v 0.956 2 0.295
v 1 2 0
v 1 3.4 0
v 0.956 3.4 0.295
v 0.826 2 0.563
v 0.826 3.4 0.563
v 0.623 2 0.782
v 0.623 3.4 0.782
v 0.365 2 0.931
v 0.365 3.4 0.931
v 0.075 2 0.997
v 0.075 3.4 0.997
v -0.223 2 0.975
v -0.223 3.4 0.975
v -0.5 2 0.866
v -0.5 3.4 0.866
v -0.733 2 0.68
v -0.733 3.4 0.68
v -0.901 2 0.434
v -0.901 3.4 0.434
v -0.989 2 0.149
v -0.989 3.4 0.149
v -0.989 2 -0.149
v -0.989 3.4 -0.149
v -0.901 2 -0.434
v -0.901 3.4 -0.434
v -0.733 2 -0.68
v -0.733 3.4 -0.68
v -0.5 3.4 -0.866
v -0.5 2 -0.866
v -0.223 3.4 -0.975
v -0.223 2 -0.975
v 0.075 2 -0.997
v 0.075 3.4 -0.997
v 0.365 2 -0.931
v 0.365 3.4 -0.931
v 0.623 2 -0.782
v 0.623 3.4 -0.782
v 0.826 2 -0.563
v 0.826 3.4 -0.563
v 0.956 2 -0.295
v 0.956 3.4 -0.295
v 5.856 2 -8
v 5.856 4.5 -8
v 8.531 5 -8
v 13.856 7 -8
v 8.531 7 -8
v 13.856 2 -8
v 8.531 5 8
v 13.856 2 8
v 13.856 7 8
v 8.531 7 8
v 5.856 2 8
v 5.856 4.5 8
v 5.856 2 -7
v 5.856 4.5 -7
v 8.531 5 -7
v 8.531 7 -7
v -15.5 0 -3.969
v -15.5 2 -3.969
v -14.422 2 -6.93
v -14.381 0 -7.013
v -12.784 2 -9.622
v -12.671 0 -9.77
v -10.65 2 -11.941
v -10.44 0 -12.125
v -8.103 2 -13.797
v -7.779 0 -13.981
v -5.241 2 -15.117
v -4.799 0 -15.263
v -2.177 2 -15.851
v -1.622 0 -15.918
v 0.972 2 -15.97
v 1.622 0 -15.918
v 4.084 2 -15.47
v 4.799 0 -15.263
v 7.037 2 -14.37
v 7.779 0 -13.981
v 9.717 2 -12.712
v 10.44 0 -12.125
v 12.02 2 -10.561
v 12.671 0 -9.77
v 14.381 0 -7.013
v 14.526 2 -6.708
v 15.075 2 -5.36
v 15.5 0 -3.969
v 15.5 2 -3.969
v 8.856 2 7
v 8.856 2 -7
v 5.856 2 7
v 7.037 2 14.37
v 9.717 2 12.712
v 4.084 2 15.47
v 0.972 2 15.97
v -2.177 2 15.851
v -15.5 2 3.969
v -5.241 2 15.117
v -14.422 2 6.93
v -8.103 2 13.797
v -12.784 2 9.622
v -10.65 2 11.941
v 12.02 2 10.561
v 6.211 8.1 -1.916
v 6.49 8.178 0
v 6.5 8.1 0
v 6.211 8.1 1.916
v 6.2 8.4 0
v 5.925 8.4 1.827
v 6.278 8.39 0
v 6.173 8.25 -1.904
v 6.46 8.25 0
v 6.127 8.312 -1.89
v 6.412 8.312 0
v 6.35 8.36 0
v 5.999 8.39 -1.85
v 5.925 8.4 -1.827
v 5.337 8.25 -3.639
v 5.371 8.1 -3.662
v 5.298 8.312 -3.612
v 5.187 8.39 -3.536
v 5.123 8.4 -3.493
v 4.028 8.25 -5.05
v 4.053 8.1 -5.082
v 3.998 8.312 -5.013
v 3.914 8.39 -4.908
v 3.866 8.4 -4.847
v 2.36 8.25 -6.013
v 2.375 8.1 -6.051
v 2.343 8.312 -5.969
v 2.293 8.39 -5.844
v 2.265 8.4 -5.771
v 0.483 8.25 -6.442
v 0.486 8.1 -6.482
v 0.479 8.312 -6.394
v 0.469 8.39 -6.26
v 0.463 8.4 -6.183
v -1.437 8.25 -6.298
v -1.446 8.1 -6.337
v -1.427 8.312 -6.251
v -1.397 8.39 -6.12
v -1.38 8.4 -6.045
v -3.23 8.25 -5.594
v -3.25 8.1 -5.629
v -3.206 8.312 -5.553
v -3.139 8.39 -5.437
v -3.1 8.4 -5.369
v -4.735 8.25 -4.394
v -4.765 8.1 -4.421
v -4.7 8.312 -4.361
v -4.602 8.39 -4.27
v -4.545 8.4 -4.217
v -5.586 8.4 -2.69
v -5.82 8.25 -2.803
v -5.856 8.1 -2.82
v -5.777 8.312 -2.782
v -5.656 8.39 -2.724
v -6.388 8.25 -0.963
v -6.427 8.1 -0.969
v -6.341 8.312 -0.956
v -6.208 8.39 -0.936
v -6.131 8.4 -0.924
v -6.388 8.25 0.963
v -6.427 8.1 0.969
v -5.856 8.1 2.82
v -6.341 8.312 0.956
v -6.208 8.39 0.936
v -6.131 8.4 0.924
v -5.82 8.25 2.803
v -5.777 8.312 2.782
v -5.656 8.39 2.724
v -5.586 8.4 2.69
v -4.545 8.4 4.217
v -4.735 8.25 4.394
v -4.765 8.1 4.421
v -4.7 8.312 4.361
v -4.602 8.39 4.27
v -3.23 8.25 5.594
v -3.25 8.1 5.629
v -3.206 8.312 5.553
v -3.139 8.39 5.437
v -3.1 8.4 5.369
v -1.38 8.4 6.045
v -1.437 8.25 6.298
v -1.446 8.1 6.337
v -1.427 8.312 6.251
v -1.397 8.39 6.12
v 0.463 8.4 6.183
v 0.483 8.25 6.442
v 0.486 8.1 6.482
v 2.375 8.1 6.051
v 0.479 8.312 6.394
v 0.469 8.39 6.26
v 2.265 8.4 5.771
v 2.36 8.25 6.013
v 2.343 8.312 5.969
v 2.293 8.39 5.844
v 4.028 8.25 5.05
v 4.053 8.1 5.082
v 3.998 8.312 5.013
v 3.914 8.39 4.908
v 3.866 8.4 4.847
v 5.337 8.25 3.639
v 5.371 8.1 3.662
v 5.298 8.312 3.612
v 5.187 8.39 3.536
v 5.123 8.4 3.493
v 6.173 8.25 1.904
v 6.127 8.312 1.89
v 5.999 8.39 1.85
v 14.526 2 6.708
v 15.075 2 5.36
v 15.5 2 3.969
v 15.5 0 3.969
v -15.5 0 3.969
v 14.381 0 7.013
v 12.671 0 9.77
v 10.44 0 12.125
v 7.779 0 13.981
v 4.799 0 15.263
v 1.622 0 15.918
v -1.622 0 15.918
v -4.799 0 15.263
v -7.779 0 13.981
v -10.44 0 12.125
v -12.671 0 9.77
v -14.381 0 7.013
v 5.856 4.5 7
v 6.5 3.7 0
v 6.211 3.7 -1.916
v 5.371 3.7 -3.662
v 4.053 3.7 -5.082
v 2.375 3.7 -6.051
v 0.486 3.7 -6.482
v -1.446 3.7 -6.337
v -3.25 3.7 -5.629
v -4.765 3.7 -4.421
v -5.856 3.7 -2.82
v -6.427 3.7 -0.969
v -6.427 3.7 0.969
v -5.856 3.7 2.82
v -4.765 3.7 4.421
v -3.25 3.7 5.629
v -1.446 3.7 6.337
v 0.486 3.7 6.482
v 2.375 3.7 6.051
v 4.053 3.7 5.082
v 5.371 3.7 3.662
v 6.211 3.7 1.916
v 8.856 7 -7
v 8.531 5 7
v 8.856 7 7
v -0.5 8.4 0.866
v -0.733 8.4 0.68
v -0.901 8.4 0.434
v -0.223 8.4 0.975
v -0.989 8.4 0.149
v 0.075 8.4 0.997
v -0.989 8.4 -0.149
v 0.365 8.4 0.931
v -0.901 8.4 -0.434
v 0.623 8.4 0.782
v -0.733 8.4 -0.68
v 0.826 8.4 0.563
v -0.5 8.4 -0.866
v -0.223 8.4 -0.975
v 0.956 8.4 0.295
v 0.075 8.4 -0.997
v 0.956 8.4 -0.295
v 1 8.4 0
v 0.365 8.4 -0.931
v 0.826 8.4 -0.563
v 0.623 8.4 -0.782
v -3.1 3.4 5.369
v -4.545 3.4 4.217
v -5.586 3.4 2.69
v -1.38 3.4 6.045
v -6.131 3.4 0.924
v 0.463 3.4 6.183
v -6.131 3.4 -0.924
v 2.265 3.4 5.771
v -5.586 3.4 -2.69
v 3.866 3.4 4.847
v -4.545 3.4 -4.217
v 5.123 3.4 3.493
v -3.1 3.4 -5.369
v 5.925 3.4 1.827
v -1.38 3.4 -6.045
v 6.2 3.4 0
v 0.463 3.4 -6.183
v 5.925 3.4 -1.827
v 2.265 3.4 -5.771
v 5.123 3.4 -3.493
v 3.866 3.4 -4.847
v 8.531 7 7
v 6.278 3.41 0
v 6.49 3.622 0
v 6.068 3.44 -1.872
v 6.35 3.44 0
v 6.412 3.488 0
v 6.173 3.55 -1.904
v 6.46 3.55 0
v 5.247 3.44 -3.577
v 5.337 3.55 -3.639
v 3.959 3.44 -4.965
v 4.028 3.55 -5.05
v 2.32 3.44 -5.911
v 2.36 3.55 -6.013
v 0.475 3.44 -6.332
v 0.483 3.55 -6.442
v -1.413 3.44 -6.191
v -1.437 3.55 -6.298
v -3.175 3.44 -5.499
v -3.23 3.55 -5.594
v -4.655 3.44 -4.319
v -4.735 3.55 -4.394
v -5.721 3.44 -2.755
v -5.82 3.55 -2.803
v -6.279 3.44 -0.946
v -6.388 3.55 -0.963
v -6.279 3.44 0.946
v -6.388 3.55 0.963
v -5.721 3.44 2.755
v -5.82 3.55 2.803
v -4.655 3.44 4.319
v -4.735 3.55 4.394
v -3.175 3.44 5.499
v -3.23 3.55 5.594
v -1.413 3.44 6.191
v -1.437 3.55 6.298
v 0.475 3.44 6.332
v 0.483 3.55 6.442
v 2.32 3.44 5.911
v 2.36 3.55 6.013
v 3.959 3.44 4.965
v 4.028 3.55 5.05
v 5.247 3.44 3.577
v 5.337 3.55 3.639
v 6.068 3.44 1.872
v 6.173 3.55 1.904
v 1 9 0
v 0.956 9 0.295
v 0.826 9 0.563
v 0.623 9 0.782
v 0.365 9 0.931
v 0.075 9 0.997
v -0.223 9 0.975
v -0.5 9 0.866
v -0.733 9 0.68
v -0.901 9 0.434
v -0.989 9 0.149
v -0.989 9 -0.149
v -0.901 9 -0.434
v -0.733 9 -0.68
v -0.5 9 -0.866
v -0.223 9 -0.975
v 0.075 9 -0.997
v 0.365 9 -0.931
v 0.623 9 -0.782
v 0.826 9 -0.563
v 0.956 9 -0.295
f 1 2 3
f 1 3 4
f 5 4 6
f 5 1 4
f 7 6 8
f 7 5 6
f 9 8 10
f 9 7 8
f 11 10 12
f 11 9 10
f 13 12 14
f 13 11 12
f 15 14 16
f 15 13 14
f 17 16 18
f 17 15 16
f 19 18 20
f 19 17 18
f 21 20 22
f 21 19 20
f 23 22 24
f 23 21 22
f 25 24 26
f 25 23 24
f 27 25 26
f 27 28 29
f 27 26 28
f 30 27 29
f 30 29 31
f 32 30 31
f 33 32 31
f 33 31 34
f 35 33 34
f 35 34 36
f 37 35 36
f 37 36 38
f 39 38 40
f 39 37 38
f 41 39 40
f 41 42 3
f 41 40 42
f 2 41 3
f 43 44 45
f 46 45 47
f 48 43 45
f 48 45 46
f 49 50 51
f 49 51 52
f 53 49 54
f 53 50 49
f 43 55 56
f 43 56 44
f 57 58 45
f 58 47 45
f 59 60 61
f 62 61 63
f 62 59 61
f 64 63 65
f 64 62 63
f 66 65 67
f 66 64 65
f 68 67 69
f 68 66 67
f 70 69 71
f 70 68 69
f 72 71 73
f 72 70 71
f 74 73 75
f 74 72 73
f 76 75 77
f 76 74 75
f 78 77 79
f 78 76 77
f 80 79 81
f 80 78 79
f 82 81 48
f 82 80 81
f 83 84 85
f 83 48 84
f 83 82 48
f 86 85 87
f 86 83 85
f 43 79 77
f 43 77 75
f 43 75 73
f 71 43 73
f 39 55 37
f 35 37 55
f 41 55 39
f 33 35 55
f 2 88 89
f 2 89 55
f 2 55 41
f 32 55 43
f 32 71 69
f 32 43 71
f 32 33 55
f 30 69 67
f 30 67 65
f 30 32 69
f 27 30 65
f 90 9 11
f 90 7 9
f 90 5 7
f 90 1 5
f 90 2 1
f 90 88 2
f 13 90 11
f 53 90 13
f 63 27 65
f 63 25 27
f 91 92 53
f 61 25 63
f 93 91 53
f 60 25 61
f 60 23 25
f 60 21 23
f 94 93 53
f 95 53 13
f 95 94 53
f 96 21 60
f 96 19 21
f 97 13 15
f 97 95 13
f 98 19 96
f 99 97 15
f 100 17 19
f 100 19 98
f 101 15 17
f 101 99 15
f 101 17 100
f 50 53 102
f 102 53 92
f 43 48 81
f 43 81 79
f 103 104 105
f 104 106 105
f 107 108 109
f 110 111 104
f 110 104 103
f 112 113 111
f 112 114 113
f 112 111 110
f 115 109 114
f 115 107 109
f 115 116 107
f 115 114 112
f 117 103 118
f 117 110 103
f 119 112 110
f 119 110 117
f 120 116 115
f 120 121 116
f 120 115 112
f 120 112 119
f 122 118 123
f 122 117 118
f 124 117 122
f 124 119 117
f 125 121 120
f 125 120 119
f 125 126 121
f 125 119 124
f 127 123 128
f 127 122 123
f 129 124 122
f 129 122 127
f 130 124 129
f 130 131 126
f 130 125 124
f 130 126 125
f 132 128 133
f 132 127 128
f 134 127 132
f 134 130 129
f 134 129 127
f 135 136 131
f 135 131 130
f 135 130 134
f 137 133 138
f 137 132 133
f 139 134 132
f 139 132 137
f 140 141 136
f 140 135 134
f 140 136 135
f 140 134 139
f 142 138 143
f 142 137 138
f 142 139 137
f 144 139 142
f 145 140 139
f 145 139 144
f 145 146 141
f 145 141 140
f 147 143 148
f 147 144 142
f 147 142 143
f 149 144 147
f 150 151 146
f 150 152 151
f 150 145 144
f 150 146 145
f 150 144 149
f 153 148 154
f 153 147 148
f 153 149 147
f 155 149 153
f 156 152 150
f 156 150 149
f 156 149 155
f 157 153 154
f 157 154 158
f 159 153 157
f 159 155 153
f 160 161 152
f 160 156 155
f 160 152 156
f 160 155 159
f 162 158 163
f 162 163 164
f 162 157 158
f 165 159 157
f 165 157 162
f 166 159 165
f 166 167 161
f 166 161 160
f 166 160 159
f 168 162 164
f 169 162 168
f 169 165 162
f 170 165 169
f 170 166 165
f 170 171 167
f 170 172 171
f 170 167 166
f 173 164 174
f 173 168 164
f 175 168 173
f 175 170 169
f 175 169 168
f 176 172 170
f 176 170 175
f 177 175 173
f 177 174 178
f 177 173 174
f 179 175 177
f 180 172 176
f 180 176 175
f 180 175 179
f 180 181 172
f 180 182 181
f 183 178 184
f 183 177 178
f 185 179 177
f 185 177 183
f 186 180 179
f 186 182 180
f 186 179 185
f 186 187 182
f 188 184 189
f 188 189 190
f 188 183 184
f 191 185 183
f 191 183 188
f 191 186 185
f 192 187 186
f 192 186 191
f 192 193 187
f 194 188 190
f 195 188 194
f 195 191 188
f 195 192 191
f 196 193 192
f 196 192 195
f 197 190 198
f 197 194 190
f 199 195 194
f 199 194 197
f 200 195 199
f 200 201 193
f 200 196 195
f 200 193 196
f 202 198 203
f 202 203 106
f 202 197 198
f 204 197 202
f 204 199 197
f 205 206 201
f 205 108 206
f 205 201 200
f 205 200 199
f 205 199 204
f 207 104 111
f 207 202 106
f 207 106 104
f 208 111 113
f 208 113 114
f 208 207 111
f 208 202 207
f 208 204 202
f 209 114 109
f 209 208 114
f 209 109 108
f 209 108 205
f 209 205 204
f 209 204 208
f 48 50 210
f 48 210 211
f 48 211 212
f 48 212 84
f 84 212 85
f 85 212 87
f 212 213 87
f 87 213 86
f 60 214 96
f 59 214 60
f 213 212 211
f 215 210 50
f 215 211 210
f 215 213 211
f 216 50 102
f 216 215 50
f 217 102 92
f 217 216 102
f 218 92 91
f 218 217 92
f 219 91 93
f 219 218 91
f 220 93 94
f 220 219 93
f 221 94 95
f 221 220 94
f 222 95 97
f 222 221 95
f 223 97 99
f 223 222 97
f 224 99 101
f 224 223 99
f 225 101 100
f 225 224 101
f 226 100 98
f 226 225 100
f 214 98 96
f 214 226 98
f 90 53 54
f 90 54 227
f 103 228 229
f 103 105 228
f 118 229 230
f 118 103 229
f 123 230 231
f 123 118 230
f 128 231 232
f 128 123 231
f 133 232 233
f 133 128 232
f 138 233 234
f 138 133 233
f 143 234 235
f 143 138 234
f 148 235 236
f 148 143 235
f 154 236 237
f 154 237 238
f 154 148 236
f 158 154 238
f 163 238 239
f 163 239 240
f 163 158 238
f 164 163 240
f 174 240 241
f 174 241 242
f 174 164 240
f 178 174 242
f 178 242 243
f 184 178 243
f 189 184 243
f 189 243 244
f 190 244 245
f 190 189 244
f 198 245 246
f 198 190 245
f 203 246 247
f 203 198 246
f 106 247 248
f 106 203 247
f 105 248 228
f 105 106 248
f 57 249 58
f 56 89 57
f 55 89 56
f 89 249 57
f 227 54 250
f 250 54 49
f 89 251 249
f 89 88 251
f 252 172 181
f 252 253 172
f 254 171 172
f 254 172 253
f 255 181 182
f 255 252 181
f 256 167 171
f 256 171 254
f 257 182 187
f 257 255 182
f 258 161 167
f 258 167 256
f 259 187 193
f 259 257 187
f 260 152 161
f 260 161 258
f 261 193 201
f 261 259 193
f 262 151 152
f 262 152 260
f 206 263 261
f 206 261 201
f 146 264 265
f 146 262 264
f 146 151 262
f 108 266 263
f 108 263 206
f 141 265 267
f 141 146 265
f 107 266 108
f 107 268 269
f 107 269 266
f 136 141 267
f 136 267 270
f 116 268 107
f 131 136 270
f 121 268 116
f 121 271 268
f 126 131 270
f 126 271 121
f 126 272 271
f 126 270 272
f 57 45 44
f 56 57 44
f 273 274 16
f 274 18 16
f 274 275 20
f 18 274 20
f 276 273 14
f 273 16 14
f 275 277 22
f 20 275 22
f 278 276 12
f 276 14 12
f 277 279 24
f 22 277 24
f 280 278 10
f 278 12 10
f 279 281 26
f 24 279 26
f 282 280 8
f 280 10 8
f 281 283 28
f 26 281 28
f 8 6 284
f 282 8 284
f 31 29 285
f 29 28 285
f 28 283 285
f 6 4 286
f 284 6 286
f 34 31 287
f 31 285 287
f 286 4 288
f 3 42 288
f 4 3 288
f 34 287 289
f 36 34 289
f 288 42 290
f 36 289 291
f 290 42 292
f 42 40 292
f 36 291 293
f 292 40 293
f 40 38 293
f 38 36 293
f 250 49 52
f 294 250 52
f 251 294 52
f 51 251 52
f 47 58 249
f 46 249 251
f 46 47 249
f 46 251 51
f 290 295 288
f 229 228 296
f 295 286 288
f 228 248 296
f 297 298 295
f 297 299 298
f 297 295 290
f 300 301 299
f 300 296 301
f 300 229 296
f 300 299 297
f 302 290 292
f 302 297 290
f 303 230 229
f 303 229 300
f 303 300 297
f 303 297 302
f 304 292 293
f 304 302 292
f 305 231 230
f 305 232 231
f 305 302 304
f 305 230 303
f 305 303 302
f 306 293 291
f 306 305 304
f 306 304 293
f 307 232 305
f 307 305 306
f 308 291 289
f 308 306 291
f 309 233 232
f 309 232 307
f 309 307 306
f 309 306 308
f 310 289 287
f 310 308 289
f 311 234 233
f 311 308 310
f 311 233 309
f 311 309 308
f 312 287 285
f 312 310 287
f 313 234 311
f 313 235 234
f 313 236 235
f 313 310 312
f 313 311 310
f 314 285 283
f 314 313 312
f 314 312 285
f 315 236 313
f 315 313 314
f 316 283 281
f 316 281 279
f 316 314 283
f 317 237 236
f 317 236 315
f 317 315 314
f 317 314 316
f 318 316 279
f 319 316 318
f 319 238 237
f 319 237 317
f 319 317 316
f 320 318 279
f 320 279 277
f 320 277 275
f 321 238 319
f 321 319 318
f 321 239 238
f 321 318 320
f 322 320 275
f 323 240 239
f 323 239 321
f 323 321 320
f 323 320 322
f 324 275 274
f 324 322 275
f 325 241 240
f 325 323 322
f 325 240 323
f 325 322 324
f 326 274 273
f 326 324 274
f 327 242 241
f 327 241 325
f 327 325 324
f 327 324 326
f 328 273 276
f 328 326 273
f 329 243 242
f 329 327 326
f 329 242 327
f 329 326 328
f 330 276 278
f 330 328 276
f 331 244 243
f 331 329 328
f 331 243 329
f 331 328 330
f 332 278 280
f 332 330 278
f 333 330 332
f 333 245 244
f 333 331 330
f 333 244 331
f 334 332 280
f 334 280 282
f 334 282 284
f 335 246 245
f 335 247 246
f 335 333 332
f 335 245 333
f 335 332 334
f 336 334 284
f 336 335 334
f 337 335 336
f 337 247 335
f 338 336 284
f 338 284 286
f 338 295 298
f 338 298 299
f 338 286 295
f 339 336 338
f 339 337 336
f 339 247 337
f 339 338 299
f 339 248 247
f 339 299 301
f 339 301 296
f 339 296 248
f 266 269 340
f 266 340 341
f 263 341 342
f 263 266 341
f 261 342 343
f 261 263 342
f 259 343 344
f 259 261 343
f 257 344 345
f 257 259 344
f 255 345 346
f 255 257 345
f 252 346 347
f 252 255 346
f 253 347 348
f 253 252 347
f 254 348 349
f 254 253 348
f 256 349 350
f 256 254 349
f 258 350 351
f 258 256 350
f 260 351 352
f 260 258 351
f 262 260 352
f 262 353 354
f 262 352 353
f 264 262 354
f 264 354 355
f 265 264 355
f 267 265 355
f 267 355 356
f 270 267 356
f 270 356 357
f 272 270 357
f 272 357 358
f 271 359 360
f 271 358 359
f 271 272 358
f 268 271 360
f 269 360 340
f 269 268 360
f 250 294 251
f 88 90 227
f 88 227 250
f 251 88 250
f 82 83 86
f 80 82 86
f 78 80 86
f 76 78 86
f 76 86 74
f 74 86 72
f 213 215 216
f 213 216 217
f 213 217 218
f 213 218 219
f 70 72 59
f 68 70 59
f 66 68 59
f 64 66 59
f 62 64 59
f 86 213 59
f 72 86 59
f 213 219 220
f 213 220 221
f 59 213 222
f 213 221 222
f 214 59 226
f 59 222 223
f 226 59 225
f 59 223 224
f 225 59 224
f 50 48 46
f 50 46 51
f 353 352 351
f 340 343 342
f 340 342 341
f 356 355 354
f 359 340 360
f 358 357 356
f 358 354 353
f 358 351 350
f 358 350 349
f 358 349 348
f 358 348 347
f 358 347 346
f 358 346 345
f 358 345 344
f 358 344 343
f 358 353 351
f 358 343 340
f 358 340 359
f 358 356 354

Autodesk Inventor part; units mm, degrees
ref_plane "YZ Plane" through (0, 0, 0) normal (1, 0, 0) x (0, 1, 0)
ref_plane "XZ Plane" through (0, 0, 0) normal (0, 1, 0) x (-1, 0, 0)
ref_plane "XY Plane" through (0, 0, 0) normal (0, 0, 1) x (1, 0, 0)
sketch "Эскиз1" plane through (0, 0, 0) normal (0, 1, 0) x (-1, 0, 0)
  circle A0 centre (0, 0) radius 16
  line L0 (15.5, 3.9686) -> (15.5, -3.9686)
  line L1 (-15.5, 3.9686) -> (-15.5, -3.9686)
  dimension "d0" = 32
  dimension "d1" = 15.5
  dimension "d2" = 15.5
extrude "Выдавливание1" add sketch "Эскиз1" along normal blind 2 contours L0 A0 L1
sketch "Эскиз2" plane through (0, 2, 0) normal (0, 1, 0) x (1, 0, 0)
  circle A0 centre (0, 0) radius 1
  dimension "d5" = 2
extrude "Выдавливание2" add sketch "Эскиз2" along normal blind 7
ref_plane "РабПлоскость1" through (0, 8.4, 0) normal (0, 1, 0) x (1, 0, 0)
sketch "Эскиз3" plane through (0, 8.4, 0) normal (0, 1, 0) x (1, 0, 0)
  circle A0 centre (0, 0) radius 1 projected
  circle A1 centre (0, 0) radius 6.5
  dimension "d9" = 13
extrude "Выдавливание3" add sketch "Эскиз3" against normal blind 5
fillet "Сопряжение1" radius 0.3 2 edges at (-6.5, 8.4, 0) (-6.5, 3.4, 0)
sketch "Эскиз4" plane through (0, 2, 0) normal (0, 1, 0) x (1, 0, 0)
  line L0 (13.8564, -8) -> (5.8564, -8)
  line L1 (5.8564, -8) -> (5.8564, 8)
  line L2 (5.8564, 8) -> (13.8564, 8)
  line L3 (13.8564, 8) -> (13.8564, -8)
  arc A0 (-15.5, -3.9686) -> (15.5, -3.9686) centre (0, 0) ccw projected
  arc A1 (15.5, 3.9686) -> (-15.5, 3.9686) centre (0, 0) ccw projected
  line L4 (5.8564, -7) -> (8.8564, -7)
  line L5 (8.8564, -7) -> (8.8564, 7)
  line L6 (8.8564, 7) -> (5.8564, 7)
  line L7 (5.8564, 7) -> (5.8564, -7)
  line L8 (13.8564, 0) -> (12.4148, 0) construction
  dimension "d13" = 8
  dimension "d14" = 16
  dimension "d21" = 5
  dimension "d22" = 14
extrude "Выдавливание4" add sketch "Эскиз4" along normal blind 5 contours L0 L1 L4 L5 L6 L2 L3
sketch "Эскиз6" plane through (5.8564, 2, 8) normal (0, 0, 1) x (1, 0, 0)
  line L0 (0, 0) -> (0, 5) projected
  line L1 (0, 0) -> (0, 2.5)
  line L2 (0, 2.5) -> (2.6743, 3)
  line L3 (2.6743, 3) -> (2.6743, 5)
  line L4 (8, 5) -> (0, 5) projected
  point P0 (-5.8564, -2)
  dimension "d23" = 2.5
  dimension "d24" = 2
extrude "Выдавливание6" cut sketch "Эскиз6" against normal blind 5
mirror "Зеркальное отражение1" about plane through (0, 0, 0) normal (0, 0, 1) of "Выдавливание6"
equation "\"d2\" = d1"
properties part number "encoder"
